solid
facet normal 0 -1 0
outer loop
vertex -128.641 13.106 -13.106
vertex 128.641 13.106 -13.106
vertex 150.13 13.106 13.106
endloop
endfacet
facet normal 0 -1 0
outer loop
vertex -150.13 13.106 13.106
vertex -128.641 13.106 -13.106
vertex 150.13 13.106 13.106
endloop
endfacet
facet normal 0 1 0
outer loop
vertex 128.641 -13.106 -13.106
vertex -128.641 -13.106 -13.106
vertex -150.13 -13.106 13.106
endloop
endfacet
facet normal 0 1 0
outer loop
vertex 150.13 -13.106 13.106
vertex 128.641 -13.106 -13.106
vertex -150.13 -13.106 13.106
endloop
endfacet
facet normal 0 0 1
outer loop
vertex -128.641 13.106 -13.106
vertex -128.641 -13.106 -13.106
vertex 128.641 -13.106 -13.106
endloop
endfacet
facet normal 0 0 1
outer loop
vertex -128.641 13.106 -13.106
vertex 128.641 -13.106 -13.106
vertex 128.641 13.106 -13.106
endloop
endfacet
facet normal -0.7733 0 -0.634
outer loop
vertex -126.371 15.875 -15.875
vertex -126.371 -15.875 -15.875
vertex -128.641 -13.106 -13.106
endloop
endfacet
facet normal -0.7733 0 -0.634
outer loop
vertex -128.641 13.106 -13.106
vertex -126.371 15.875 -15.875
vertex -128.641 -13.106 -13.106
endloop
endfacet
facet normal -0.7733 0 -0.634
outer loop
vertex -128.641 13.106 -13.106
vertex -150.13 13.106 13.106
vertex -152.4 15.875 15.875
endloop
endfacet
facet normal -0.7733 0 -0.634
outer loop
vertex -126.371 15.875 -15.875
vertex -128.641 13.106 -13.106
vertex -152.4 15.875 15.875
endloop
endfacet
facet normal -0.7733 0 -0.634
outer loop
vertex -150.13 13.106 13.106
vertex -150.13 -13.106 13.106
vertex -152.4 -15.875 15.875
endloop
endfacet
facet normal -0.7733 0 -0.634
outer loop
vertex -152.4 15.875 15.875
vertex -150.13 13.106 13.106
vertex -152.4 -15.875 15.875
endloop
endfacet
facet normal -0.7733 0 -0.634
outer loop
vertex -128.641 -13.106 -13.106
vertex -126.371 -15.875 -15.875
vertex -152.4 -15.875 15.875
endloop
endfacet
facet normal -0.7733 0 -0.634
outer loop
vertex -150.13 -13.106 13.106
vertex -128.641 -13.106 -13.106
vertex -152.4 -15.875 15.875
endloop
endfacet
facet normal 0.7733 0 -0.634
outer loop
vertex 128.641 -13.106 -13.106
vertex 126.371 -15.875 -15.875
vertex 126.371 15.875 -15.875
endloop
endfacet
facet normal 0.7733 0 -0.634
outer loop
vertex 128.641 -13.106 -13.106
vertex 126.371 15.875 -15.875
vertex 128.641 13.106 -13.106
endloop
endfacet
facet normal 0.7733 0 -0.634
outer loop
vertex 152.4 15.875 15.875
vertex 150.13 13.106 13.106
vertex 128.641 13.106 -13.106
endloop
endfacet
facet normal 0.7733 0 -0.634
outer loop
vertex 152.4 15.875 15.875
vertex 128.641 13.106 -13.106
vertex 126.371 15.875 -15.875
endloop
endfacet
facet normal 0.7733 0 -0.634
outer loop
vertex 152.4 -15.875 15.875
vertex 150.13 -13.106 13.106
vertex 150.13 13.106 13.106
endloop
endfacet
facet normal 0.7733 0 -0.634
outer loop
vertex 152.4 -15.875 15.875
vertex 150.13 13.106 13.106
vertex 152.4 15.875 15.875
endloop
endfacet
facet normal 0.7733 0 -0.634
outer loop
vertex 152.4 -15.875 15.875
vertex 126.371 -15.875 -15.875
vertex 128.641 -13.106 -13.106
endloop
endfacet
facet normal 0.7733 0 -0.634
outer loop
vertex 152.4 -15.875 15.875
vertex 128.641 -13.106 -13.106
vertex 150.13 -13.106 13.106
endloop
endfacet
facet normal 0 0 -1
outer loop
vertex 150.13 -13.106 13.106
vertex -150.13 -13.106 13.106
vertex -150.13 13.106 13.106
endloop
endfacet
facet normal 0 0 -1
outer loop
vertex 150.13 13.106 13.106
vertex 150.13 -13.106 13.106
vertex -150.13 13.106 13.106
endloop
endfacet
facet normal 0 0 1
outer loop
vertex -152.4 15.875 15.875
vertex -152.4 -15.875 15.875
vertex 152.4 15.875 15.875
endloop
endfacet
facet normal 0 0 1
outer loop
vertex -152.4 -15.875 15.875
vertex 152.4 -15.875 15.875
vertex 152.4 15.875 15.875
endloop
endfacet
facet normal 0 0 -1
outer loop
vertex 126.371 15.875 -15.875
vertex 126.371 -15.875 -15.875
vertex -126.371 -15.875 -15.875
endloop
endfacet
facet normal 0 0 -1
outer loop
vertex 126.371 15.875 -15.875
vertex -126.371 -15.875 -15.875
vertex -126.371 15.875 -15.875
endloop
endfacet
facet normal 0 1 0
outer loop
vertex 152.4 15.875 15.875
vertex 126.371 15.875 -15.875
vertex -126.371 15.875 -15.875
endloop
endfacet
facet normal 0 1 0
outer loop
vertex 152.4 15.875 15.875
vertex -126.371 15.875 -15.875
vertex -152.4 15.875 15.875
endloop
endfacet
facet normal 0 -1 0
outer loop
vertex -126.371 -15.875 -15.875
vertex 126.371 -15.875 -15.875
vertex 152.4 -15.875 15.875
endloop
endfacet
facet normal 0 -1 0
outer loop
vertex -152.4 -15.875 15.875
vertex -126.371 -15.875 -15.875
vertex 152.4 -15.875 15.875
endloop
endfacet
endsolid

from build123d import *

# Parameters (mm, degrees)
SKETCH_W       = 31.75
SKETCH_H       = 31.75
SKETCH_W_2     = 26.2128
SKETCH_H_2     = 26.2128
PAD_DEPTH      = 152.4
PAD_DEPTH_BACK = 152.4
POCKET_DEPTH   = 31.75


with BuildPart() as part:
    # Sketch → Pad (new body, two sides)
    with BuildSketch(Plane.YZ) as pad_sk:
        Rectangle(SKETCH_W, SKETCH_H)
        Rectangle(SKETCH_W_2, SKETCH_H_2, mode=Mode.SUBTRACT)
    extrude(amount=PAD_DEPTH)
    extrude(pad_sk.sketch, amount=-PAD_DEPTH_BACK)

    # Sketch001 → Pocket (cut)
    with BuildSketch(Plane(origin=(0, -15.875, 0), x_dir=(0, 0, -1), z_dir=(0, -1, 0))):
        Polygon((-15.875, 152.4), (15.875, 152.4), (15.875, 126.371257), align=None)
    pocket = extrude(amount=-POCKET_DEPTH, mode=Mode.SUBTRACT)

    # Mirrored: Pocket across Sketch001 H_Axis
    add(pocket.mirror(Plane(origin=(0, -15.875, 0), x_dir=(0, -1, 0), z_dir=(1, 0, 0))), mode=Mode.SUBTRACT)


solid = part.part
